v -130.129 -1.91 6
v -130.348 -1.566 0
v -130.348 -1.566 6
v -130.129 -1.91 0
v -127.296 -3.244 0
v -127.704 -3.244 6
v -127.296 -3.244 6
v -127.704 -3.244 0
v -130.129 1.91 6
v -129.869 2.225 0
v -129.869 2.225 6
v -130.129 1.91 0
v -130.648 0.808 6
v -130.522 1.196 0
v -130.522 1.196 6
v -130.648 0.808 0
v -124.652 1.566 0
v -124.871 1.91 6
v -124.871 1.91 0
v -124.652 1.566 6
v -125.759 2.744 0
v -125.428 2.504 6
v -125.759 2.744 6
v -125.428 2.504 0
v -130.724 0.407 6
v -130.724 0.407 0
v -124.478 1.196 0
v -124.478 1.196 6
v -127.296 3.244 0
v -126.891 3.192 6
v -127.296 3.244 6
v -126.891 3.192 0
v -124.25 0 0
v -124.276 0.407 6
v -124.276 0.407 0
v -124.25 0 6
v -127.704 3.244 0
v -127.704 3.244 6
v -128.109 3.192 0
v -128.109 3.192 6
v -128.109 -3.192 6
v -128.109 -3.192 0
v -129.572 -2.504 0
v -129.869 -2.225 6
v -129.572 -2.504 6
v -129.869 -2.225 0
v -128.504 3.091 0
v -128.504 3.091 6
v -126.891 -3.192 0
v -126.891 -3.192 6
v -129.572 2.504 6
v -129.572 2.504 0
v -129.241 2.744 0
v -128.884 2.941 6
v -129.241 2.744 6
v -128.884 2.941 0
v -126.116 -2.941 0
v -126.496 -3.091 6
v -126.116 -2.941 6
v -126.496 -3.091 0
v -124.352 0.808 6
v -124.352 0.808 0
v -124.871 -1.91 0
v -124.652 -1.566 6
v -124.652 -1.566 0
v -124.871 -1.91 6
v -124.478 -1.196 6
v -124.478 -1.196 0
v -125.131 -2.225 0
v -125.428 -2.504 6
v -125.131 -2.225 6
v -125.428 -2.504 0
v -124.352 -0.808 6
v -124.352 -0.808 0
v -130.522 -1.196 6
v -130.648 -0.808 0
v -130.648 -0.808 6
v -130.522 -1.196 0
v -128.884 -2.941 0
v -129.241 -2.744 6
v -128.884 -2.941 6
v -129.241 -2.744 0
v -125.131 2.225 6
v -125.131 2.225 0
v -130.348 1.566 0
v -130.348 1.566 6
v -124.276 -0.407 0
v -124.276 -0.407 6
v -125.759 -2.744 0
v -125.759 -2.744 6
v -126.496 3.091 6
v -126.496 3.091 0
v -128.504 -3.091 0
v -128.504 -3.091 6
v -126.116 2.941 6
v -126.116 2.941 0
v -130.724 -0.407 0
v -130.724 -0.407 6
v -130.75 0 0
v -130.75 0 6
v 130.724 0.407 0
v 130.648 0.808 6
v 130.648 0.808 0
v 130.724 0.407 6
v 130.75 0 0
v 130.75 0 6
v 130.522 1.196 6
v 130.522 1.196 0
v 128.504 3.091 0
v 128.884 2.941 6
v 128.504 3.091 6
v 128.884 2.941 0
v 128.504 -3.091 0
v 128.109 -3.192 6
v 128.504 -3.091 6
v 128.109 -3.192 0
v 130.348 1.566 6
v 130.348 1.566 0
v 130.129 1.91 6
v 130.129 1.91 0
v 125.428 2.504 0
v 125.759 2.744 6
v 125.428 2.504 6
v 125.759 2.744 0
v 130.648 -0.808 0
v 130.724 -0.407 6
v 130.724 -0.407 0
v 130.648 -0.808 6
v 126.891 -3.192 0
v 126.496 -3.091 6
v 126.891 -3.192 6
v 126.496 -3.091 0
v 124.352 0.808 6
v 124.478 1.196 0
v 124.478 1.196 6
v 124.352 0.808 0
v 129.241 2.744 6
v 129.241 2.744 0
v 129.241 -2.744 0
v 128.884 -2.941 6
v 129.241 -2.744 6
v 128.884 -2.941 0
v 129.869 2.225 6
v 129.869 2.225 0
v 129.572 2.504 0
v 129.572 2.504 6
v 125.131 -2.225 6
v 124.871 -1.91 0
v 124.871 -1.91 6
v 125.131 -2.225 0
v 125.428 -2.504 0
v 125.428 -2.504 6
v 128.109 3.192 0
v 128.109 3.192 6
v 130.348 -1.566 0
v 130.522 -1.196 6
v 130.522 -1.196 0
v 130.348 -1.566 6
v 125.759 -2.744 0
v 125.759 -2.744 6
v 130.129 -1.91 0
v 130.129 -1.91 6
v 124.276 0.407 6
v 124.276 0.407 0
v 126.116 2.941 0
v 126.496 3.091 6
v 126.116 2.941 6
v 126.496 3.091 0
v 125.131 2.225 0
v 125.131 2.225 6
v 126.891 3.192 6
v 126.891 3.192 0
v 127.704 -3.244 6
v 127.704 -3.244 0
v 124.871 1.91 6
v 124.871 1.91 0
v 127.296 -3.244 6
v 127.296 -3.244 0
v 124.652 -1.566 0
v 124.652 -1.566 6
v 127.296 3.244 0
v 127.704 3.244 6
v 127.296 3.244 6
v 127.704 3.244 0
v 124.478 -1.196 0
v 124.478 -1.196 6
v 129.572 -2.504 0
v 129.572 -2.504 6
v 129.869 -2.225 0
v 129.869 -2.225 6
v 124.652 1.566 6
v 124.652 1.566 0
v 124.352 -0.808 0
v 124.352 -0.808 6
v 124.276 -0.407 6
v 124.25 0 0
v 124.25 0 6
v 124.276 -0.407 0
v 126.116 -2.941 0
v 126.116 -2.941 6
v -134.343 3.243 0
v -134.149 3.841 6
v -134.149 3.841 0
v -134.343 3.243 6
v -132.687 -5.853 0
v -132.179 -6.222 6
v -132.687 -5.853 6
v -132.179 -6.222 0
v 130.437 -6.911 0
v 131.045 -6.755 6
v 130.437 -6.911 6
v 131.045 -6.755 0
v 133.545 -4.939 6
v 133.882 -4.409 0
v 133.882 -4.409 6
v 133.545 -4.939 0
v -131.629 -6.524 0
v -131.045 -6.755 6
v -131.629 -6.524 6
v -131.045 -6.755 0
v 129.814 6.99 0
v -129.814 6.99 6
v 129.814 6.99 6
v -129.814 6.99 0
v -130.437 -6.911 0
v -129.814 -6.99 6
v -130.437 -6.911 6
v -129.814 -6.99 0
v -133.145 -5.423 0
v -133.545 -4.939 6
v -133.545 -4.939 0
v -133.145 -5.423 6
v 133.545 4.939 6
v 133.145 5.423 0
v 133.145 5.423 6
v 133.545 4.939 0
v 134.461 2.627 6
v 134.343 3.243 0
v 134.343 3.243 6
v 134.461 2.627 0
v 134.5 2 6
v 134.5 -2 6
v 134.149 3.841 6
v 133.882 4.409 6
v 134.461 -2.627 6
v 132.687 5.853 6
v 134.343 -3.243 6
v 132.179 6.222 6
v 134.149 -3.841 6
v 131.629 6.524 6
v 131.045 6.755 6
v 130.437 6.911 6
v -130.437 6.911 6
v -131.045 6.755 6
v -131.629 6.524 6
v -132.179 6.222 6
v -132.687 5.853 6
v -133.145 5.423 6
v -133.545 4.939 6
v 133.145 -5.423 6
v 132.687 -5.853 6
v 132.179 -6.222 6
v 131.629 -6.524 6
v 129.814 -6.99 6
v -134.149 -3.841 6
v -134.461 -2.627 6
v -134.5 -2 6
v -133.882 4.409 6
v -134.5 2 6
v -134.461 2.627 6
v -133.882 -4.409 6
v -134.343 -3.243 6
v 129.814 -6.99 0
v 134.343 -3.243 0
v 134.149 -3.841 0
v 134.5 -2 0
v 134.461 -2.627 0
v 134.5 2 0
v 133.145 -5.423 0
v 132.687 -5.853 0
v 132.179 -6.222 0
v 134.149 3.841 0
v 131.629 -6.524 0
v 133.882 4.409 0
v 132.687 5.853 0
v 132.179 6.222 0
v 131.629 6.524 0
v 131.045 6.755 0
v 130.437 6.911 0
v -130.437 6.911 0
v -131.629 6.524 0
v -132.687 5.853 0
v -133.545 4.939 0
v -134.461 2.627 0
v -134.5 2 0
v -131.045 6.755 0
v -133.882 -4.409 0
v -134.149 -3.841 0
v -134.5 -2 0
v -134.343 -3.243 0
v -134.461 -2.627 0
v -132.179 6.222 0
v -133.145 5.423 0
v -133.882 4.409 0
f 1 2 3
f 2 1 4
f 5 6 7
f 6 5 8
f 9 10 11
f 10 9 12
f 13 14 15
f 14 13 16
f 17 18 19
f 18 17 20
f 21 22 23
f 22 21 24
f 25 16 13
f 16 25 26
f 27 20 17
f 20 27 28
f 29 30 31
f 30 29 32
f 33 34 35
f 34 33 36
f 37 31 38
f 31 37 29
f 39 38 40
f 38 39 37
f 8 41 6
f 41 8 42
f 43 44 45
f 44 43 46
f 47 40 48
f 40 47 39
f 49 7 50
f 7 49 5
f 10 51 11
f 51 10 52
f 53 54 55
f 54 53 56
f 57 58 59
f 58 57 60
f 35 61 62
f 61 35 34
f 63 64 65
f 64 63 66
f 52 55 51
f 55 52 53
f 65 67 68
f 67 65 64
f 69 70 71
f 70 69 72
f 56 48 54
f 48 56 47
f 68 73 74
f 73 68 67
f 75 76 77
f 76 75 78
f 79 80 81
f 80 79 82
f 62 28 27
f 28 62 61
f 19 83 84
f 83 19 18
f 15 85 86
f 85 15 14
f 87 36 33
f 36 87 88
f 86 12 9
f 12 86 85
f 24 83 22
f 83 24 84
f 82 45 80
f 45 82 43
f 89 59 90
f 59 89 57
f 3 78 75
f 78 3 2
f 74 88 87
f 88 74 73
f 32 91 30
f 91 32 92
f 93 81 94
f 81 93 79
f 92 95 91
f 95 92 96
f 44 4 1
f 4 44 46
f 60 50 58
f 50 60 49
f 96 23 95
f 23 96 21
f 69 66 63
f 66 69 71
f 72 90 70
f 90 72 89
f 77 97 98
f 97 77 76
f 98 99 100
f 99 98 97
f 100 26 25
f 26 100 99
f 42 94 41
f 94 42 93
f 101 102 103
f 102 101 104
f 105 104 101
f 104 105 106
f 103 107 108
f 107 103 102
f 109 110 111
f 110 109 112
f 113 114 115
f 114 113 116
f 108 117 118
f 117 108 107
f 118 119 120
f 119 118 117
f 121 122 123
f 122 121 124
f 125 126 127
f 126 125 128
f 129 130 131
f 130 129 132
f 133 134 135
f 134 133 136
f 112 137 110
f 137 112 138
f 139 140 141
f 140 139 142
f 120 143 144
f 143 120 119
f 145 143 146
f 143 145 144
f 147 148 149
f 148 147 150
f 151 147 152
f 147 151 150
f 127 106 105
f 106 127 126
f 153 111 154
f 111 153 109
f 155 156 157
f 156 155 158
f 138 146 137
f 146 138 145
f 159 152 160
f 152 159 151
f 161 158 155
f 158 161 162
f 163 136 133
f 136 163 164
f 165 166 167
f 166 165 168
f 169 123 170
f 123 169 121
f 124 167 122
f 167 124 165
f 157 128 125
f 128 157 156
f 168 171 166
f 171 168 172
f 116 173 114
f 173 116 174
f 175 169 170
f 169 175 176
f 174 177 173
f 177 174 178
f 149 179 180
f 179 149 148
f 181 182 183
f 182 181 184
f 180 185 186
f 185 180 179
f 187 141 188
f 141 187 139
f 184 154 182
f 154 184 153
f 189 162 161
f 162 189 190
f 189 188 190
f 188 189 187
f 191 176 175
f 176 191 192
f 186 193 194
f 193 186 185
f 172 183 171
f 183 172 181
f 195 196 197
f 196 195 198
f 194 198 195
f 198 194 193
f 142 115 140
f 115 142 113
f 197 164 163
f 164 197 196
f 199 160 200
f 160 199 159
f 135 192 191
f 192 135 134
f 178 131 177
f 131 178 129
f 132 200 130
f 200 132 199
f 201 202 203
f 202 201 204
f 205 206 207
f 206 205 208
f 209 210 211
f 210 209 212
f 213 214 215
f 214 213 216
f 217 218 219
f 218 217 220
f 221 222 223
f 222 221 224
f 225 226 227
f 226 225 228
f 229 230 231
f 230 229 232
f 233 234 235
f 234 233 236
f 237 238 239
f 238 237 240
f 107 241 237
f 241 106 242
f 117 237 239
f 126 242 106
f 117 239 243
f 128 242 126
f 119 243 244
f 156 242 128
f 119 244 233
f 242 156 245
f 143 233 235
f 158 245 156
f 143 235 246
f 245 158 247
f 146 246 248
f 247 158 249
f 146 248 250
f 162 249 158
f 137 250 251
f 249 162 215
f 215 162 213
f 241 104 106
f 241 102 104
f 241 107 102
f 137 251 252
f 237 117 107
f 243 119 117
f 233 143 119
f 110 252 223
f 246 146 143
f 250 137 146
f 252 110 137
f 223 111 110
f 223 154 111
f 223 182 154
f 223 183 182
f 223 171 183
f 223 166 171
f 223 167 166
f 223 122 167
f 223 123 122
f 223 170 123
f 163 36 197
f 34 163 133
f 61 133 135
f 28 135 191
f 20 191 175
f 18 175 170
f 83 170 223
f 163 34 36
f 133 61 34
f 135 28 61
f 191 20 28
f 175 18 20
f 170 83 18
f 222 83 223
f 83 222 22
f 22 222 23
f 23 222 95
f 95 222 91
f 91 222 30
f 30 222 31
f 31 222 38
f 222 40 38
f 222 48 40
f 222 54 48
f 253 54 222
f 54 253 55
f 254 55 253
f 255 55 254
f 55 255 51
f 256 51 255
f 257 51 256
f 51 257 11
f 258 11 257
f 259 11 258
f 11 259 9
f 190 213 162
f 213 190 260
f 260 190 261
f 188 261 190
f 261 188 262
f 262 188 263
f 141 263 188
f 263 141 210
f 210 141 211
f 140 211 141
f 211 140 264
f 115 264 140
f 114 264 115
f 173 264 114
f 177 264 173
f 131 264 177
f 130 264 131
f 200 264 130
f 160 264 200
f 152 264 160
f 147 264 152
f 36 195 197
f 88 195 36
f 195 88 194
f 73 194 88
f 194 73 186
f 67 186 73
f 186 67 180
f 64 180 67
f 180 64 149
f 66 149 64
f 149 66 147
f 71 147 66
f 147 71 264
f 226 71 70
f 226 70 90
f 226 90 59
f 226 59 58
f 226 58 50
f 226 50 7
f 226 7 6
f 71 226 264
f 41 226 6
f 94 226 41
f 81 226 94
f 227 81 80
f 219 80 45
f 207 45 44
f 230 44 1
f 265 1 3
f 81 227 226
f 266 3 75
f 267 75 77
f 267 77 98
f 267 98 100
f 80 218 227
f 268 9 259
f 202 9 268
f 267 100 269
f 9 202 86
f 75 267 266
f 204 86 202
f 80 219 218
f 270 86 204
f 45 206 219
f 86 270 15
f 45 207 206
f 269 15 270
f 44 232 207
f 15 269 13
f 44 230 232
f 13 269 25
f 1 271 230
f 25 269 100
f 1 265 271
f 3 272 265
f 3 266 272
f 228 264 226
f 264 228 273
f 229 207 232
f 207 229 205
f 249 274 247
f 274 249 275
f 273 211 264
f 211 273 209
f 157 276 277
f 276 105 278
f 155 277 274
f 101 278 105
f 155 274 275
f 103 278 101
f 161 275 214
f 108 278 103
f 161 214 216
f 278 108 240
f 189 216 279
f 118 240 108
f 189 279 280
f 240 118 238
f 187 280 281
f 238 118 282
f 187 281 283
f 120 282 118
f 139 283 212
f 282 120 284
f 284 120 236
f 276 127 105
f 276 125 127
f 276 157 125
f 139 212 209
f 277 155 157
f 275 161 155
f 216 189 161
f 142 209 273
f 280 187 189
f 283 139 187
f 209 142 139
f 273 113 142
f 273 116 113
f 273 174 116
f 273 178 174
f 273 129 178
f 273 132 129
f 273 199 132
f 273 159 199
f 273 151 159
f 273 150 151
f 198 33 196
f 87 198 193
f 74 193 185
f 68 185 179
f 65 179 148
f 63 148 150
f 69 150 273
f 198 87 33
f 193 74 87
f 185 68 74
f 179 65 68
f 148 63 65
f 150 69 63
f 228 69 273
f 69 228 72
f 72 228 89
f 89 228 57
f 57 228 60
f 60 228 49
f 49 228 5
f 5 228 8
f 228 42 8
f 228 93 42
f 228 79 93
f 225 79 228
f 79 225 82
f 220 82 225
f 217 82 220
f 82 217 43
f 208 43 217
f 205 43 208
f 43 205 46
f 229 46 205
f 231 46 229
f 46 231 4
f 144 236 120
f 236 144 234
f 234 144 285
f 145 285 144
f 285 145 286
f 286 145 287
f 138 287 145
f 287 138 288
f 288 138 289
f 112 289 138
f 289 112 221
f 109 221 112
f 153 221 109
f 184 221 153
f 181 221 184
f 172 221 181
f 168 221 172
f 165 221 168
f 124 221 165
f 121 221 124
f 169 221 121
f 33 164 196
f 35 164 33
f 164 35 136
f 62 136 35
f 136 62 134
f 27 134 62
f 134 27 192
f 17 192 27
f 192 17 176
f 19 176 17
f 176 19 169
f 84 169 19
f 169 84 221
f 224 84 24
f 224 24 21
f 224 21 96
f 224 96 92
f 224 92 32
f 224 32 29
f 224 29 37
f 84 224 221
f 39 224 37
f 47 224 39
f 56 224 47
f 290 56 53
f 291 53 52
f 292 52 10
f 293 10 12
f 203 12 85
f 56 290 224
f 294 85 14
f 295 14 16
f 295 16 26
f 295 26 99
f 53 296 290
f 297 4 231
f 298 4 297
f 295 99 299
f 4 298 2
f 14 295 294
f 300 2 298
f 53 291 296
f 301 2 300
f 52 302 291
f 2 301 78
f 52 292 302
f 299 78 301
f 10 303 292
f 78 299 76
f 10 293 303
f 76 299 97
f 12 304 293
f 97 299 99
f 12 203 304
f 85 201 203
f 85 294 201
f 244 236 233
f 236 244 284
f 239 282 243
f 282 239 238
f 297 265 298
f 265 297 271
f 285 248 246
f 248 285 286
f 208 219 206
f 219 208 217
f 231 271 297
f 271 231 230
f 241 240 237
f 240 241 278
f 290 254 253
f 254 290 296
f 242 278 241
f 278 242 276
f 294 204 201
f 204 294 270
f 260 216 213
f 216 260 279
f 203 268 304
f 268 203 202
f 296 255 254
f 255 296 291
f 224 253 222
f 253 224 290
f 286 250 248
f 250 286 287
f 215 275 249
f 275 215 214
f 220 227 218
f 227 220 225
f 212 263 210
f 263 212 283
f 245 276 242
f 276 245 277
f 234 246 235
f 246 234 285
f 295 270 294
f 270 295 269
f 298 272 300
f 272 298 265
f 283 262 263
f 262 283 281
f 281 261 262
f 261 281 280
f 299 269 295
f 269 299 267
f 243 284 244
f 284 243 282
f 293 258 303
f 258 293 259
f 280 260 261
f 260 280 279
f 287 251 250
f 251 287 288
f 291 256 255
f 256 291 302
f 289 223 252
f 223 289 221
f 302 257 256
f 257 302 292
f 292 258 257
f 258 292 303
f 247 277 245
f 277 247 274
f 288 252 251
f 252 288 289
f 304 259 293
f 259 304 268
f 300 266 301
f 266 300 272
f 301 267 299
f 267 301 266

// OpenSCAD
$fn = 50;


difference() {
	union() {
		hull() {
			translate(v = [-129.5000000000, 2.0000000000, 0]) {
				cylinder(h = 6, r = 5);
			}
			translate(v = [129.5000000000, 2.0000000000, 0]) {
				cylinder(h = 6, r = 5);
			}
			translate(v = [-129.5000000000, -2.0000000000, 0]) {
				cylinder(h = 6, r = 5);
			}
			translate(v = [129.5000000000, -2.0000000000, 0]) {
				cylinder(h = 6, r = 5);
			}
		}
	}
	union() {
		translate(v = [-127.5000000000, 0.0000000000, -100.0000000000]) {
			cylinder(h = 200, r = 3.2500000000);
		}
		translate(v = [-127.5000000000, 0.0000000000, -100.0000000000]) {
			cylinder(h = 200, r = 3.2500000000);
		}
		translate(v = [127.5000000000, 0.0000000000, -100.0000000000]) {
			cylinder(h = 200, r = 3.2500000000);
		}
		translate(v = [127.5000000000, 0.0000000000, -100.0000000000]) {
			cylinder(h = 200, r = 3.2500000000);
		}
	}
}
